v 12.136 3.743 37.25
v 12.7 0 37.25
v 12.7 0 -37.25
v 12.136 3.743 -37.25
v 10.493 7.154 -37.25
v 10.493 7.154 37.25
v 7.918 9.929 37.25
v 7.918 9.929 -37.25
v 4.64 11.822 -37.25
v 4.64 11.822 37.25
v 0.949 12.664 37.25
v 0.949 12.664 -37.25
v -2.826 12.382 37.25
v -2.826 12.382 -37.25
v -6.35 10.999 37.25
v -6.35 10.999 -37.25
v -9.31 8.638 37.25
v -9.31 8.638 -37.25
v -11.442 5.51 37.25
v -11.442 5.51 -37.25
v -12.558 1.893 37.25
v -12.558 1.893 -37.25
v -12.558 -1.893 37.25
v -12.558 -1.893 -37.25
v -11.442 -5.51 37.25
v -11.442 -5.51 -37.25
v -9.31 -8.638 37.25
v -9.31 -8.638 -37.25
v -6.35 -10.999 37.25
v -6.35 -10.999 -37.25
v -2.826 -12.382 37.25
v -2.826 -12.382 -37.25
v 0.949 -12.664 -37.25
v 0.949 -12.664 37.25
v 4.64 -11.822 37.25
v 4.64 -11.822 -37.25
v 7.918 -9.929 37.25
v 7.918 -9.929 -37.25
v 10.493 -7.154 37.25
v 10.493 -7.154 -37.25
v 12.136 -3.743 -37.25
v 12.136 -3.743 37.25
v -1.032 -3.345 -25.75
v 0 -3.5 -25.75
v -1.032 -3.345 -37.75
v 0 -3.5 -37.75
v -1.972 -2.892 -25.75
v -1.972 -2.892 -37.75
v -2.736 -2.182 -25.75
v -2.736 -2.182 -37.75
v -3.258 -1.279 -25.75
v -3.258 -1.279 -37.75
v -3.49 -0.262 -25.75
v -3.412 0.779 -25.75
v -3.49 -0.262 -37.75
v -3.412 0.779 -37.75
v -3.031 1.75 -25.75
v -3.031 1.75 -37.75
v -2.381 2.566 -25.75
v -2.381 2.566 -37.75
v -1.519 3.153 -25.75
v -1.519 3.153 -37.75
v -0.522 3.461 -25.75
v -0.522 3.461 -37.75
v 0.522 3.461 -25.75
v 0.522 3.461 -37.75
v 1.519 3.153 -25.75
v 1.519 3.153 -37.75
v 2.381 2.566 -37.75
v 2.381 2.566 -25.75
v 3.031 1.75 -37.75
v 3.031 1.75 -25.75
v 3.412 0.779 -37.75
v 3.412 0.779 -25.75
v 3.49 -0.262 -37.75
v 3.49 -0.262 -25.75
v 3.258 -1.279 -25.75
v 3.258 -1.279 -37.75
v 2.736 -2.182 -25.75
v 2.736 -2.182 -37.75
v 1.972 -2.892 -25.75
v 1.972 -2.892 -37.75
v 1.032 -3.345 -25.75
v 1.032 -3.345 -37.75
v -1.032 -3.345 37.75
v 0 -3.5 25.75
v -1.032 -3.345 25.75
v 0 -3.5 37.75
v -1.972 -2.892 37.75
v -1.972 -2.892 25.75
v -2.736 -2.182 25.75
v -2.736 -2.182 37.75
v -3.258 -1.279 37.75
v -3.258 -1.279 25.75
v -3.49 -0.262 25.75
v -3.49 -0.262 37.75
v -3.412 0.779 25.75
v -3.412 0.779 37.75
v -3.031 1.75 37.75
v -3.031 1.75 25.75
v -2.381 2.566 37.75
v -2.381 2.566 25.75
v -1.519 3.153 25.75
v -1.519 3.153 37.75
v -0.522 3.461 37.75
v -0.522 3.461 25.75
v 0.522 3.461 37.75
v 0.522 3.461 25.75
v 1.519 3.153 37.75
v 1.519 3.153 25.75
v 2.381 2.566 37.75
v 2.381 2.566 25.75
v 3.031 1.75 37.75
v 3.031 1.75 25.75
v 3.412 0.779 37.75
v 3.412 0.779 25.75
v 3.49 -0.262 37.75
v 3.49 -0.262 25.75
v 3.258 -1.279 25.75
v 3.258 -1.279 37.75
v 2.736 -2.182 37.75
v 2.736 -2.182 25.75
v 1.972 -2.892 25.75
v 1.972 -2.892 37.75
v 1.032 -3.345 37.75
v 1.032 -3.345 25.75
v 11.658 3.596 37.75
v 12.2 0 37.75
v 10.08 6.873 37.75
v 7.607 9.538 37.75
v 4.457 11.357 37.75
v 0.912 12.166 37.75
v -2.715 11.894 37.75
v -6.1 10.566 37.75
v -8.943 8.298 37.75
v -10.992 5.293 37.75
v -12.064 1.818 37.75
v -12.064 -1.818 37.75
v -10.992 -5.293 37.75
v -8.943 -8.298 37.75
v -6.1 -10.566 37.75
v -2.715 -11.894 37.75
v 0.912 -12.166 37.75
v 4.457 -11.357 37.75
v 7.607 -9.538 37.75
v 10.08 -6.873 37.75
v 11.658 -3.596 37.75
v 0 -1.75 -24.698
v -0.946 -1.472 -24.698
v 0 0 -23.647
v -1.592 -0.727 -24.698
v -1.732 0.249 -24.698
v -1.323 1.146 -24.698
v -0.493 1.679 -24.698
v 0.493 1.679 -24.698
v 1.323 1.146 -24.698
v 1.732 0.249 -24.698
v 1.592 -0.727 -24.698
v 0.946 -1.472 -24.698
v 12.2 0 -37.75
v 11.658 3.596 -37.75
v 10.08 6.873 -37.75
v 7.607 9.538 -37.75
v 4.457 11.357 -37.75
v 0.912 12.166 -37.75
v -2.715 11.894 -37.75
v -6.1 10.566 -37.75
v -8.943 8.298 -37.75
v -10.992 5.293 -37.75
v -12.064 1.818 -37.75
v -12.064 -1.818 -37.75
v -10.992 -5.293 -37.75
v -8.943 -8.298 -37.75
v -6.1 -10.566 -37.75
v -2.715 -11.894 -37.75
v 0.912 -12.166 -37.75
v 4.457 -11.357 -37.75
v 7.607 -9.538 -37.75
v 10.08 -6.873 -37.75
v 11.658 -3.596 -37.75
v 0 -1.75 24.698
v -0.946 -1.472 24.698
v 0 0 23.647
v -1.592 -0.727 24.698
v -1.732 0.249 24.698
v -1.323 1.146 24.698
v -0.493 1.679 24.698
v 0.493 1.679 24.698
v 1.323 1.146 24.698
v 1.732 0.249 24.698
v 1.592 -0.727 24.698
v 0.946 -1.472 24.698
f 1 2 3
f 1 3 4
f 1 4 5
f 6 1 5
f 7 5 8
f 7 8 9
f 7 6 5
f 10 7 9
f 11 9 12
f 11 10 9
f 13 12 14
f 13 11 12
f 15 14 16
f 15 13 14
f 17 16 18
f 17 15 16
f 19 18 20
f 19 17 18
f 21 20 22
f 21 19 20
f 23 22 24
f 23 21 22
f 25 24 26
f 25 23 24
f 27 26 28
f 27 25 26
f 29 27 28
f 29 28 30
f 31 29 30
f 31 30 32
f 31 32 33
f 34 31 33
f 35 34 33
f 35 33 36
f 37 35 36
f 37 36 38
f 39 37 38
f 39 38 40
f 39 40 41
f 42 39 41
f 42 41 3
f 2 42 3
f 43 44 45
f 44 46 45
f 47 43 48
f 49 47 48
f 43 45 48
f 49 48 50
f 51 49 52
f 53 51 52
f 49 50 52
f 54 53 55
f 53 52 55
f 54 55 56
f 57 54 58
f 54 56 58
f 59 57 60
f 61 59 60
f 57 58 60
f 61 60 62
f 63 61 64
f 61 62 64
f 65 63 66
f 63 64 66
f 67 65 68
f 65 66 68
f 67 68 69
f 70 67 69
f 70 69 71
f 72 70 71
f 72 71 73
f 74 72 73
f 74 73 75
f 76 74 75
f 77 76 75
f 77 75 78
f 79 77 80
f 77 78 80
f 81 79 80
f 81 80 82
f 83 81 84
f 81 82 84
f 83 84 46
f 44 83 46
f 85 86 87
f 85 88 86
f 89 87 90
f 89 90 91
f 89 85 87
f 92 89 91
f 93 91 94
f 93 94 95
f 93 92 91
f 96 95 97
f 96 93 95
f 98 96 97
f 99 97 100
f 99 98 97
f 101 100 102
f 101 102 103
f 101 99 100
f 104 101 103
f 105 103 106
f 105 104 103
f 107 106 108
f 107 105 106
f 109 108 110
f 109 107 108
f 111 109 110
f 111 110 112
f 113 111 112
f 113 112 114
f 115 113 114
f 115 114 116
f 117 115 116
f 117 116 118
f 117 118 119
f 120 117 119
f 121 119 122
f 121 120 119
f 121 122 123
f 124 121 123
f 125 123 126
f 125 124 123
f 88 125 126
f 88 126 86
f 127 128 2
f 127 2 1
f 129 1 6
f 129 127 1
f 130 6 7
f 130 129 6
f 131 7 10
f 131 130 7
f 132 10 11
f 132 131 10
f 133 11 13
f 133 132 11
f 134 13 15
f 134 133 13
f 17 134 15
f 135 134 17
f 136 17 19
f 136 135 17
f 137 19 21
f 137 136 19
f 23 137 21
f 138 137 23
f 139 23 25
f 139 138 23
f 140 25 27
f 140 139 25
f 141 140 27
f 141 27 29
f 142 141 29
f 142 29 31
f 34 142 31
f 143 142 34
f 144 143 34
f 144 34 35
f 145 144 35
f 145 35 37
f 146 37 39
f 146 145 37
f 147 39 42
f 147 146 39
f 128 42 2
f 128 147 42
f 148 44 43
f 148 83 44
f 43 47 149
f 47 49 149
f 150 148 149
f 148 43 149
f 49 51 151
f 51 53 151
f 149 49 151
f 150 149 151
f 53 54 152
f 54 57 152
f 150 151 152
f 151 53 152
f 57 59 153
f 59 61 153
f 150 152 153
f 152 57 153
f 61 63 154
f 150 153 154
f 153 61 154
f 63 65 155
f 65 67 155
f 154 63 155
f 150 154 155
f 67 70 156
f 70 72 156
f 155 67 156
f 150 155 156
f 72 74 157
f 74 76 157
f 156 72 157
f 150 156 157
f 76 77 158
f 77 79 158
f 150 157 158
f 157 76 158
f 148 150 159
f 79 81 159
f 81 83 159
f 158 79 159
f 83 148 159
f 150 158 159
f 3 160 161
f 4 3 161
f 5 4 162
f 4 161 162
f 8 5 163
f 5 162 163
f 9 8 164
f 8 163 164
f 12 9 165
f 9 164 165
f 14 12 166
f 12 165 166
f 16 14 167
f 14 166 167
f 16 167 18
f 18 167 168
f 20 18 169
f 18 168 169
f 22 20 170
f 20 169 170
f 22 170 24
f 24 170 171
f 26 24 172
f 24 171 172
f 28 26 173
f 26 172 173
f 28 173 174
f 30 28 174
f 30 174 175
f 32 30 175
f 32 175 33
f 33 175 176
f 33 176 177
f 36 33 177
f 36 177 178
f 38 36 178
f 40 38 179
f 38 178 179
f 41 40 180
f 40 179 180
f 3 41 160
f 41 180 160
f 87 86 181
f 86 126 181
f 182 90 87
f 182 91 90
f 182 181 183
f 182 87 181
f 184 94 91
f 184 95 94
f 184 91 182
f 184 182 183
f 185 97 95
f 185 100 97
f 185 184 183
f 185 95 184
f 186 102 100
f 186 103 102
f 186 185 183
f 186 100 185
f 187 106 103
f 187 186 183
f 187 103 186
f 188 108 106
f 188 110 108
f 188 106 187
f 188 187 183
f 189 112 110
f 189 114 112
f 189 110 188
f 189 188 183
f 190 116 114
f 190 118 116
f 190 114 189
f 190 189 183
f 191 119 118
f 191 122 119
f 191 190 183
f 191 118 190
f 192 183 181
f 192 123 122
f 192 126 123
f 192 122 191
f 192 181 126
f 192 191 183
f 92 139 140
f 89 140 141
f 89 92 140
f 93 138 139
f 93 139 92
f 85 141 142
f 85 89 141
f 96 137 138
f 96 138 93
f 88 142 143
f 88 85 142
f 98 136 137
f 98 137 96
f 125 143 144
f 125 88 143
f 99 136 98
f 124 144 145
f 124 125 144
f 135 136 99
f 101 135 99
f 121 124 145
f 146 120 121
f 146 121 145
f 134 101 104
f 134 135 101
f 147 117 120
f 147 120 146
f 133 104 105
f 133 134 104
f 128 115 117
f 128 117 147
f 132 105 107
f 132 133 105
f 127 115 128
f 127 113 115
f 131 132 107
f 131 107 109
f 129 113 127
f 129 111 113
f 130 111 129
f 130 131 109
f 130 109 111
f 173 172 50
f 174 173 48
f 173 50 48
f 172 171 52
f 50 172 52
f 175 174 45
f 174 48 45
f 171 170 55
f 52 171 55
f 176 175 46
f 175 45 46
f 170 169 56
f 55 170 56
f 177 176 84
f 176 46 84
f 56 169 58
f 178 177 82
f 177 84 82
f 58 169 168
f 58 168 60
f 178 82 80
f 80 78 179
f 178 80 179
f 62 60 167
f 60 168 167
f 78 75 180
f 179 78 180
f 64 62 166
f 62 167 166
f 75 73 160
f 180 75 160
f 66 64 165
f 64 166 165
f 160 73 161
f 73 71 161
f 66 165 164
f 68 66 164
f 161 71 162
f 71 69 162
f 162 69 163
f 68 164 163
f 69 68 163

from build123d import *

# Parameters (mm, degrees)
SKETCH1_R           = 12.7
BOSS_EXTRUDE1_DEPTH = 37.75
CHAMFER1_SIZE       = 0.5


with BuildPart() as part:
    # Sketch1 → Boss-Extrude1 (new, symmetric)
    with BuildSketch(Plane.XY):
        Circle(SKETCH1_R)
    extrude(amount=BOSS_EXTRUDE1_DEPTH, both=True)

    # Sketch2 → M8x1.0 Tapped Hole1 (revolve, cut)
    with BuildSketch(Plane(origin=(0, 0, 37.75), x_dir=(0, -1, 0), z_dir=(1, 0, 0))):
        Polygon((0, 0), (0, 14.103012167), (3.5, 12), (3.5, 0), align=None)
    m8x1_0_tapped_hole1 = revolve(axis=Axis((0, 0, 44.1), (0, 0, -1)), mode=Mode.SUBTRACT)

    # Mirror1: M8x1.0 Tapped Hole1 across plane
    add(m8x1_0_tapped_hole1.mirror(Plane.XY), mode=Mode.SUBTRACT)

    # Chamfer1
    chamfer1_edges = [part.edges().sort_by_distance(p)[0] for p in [
        (-12.7, 0, -37.75),
        (-12.7, 0, 37.75),
    ]]
    chamfer(chamfer1_edges, length=CHAMFER1_SIZE)


solid = part.part
